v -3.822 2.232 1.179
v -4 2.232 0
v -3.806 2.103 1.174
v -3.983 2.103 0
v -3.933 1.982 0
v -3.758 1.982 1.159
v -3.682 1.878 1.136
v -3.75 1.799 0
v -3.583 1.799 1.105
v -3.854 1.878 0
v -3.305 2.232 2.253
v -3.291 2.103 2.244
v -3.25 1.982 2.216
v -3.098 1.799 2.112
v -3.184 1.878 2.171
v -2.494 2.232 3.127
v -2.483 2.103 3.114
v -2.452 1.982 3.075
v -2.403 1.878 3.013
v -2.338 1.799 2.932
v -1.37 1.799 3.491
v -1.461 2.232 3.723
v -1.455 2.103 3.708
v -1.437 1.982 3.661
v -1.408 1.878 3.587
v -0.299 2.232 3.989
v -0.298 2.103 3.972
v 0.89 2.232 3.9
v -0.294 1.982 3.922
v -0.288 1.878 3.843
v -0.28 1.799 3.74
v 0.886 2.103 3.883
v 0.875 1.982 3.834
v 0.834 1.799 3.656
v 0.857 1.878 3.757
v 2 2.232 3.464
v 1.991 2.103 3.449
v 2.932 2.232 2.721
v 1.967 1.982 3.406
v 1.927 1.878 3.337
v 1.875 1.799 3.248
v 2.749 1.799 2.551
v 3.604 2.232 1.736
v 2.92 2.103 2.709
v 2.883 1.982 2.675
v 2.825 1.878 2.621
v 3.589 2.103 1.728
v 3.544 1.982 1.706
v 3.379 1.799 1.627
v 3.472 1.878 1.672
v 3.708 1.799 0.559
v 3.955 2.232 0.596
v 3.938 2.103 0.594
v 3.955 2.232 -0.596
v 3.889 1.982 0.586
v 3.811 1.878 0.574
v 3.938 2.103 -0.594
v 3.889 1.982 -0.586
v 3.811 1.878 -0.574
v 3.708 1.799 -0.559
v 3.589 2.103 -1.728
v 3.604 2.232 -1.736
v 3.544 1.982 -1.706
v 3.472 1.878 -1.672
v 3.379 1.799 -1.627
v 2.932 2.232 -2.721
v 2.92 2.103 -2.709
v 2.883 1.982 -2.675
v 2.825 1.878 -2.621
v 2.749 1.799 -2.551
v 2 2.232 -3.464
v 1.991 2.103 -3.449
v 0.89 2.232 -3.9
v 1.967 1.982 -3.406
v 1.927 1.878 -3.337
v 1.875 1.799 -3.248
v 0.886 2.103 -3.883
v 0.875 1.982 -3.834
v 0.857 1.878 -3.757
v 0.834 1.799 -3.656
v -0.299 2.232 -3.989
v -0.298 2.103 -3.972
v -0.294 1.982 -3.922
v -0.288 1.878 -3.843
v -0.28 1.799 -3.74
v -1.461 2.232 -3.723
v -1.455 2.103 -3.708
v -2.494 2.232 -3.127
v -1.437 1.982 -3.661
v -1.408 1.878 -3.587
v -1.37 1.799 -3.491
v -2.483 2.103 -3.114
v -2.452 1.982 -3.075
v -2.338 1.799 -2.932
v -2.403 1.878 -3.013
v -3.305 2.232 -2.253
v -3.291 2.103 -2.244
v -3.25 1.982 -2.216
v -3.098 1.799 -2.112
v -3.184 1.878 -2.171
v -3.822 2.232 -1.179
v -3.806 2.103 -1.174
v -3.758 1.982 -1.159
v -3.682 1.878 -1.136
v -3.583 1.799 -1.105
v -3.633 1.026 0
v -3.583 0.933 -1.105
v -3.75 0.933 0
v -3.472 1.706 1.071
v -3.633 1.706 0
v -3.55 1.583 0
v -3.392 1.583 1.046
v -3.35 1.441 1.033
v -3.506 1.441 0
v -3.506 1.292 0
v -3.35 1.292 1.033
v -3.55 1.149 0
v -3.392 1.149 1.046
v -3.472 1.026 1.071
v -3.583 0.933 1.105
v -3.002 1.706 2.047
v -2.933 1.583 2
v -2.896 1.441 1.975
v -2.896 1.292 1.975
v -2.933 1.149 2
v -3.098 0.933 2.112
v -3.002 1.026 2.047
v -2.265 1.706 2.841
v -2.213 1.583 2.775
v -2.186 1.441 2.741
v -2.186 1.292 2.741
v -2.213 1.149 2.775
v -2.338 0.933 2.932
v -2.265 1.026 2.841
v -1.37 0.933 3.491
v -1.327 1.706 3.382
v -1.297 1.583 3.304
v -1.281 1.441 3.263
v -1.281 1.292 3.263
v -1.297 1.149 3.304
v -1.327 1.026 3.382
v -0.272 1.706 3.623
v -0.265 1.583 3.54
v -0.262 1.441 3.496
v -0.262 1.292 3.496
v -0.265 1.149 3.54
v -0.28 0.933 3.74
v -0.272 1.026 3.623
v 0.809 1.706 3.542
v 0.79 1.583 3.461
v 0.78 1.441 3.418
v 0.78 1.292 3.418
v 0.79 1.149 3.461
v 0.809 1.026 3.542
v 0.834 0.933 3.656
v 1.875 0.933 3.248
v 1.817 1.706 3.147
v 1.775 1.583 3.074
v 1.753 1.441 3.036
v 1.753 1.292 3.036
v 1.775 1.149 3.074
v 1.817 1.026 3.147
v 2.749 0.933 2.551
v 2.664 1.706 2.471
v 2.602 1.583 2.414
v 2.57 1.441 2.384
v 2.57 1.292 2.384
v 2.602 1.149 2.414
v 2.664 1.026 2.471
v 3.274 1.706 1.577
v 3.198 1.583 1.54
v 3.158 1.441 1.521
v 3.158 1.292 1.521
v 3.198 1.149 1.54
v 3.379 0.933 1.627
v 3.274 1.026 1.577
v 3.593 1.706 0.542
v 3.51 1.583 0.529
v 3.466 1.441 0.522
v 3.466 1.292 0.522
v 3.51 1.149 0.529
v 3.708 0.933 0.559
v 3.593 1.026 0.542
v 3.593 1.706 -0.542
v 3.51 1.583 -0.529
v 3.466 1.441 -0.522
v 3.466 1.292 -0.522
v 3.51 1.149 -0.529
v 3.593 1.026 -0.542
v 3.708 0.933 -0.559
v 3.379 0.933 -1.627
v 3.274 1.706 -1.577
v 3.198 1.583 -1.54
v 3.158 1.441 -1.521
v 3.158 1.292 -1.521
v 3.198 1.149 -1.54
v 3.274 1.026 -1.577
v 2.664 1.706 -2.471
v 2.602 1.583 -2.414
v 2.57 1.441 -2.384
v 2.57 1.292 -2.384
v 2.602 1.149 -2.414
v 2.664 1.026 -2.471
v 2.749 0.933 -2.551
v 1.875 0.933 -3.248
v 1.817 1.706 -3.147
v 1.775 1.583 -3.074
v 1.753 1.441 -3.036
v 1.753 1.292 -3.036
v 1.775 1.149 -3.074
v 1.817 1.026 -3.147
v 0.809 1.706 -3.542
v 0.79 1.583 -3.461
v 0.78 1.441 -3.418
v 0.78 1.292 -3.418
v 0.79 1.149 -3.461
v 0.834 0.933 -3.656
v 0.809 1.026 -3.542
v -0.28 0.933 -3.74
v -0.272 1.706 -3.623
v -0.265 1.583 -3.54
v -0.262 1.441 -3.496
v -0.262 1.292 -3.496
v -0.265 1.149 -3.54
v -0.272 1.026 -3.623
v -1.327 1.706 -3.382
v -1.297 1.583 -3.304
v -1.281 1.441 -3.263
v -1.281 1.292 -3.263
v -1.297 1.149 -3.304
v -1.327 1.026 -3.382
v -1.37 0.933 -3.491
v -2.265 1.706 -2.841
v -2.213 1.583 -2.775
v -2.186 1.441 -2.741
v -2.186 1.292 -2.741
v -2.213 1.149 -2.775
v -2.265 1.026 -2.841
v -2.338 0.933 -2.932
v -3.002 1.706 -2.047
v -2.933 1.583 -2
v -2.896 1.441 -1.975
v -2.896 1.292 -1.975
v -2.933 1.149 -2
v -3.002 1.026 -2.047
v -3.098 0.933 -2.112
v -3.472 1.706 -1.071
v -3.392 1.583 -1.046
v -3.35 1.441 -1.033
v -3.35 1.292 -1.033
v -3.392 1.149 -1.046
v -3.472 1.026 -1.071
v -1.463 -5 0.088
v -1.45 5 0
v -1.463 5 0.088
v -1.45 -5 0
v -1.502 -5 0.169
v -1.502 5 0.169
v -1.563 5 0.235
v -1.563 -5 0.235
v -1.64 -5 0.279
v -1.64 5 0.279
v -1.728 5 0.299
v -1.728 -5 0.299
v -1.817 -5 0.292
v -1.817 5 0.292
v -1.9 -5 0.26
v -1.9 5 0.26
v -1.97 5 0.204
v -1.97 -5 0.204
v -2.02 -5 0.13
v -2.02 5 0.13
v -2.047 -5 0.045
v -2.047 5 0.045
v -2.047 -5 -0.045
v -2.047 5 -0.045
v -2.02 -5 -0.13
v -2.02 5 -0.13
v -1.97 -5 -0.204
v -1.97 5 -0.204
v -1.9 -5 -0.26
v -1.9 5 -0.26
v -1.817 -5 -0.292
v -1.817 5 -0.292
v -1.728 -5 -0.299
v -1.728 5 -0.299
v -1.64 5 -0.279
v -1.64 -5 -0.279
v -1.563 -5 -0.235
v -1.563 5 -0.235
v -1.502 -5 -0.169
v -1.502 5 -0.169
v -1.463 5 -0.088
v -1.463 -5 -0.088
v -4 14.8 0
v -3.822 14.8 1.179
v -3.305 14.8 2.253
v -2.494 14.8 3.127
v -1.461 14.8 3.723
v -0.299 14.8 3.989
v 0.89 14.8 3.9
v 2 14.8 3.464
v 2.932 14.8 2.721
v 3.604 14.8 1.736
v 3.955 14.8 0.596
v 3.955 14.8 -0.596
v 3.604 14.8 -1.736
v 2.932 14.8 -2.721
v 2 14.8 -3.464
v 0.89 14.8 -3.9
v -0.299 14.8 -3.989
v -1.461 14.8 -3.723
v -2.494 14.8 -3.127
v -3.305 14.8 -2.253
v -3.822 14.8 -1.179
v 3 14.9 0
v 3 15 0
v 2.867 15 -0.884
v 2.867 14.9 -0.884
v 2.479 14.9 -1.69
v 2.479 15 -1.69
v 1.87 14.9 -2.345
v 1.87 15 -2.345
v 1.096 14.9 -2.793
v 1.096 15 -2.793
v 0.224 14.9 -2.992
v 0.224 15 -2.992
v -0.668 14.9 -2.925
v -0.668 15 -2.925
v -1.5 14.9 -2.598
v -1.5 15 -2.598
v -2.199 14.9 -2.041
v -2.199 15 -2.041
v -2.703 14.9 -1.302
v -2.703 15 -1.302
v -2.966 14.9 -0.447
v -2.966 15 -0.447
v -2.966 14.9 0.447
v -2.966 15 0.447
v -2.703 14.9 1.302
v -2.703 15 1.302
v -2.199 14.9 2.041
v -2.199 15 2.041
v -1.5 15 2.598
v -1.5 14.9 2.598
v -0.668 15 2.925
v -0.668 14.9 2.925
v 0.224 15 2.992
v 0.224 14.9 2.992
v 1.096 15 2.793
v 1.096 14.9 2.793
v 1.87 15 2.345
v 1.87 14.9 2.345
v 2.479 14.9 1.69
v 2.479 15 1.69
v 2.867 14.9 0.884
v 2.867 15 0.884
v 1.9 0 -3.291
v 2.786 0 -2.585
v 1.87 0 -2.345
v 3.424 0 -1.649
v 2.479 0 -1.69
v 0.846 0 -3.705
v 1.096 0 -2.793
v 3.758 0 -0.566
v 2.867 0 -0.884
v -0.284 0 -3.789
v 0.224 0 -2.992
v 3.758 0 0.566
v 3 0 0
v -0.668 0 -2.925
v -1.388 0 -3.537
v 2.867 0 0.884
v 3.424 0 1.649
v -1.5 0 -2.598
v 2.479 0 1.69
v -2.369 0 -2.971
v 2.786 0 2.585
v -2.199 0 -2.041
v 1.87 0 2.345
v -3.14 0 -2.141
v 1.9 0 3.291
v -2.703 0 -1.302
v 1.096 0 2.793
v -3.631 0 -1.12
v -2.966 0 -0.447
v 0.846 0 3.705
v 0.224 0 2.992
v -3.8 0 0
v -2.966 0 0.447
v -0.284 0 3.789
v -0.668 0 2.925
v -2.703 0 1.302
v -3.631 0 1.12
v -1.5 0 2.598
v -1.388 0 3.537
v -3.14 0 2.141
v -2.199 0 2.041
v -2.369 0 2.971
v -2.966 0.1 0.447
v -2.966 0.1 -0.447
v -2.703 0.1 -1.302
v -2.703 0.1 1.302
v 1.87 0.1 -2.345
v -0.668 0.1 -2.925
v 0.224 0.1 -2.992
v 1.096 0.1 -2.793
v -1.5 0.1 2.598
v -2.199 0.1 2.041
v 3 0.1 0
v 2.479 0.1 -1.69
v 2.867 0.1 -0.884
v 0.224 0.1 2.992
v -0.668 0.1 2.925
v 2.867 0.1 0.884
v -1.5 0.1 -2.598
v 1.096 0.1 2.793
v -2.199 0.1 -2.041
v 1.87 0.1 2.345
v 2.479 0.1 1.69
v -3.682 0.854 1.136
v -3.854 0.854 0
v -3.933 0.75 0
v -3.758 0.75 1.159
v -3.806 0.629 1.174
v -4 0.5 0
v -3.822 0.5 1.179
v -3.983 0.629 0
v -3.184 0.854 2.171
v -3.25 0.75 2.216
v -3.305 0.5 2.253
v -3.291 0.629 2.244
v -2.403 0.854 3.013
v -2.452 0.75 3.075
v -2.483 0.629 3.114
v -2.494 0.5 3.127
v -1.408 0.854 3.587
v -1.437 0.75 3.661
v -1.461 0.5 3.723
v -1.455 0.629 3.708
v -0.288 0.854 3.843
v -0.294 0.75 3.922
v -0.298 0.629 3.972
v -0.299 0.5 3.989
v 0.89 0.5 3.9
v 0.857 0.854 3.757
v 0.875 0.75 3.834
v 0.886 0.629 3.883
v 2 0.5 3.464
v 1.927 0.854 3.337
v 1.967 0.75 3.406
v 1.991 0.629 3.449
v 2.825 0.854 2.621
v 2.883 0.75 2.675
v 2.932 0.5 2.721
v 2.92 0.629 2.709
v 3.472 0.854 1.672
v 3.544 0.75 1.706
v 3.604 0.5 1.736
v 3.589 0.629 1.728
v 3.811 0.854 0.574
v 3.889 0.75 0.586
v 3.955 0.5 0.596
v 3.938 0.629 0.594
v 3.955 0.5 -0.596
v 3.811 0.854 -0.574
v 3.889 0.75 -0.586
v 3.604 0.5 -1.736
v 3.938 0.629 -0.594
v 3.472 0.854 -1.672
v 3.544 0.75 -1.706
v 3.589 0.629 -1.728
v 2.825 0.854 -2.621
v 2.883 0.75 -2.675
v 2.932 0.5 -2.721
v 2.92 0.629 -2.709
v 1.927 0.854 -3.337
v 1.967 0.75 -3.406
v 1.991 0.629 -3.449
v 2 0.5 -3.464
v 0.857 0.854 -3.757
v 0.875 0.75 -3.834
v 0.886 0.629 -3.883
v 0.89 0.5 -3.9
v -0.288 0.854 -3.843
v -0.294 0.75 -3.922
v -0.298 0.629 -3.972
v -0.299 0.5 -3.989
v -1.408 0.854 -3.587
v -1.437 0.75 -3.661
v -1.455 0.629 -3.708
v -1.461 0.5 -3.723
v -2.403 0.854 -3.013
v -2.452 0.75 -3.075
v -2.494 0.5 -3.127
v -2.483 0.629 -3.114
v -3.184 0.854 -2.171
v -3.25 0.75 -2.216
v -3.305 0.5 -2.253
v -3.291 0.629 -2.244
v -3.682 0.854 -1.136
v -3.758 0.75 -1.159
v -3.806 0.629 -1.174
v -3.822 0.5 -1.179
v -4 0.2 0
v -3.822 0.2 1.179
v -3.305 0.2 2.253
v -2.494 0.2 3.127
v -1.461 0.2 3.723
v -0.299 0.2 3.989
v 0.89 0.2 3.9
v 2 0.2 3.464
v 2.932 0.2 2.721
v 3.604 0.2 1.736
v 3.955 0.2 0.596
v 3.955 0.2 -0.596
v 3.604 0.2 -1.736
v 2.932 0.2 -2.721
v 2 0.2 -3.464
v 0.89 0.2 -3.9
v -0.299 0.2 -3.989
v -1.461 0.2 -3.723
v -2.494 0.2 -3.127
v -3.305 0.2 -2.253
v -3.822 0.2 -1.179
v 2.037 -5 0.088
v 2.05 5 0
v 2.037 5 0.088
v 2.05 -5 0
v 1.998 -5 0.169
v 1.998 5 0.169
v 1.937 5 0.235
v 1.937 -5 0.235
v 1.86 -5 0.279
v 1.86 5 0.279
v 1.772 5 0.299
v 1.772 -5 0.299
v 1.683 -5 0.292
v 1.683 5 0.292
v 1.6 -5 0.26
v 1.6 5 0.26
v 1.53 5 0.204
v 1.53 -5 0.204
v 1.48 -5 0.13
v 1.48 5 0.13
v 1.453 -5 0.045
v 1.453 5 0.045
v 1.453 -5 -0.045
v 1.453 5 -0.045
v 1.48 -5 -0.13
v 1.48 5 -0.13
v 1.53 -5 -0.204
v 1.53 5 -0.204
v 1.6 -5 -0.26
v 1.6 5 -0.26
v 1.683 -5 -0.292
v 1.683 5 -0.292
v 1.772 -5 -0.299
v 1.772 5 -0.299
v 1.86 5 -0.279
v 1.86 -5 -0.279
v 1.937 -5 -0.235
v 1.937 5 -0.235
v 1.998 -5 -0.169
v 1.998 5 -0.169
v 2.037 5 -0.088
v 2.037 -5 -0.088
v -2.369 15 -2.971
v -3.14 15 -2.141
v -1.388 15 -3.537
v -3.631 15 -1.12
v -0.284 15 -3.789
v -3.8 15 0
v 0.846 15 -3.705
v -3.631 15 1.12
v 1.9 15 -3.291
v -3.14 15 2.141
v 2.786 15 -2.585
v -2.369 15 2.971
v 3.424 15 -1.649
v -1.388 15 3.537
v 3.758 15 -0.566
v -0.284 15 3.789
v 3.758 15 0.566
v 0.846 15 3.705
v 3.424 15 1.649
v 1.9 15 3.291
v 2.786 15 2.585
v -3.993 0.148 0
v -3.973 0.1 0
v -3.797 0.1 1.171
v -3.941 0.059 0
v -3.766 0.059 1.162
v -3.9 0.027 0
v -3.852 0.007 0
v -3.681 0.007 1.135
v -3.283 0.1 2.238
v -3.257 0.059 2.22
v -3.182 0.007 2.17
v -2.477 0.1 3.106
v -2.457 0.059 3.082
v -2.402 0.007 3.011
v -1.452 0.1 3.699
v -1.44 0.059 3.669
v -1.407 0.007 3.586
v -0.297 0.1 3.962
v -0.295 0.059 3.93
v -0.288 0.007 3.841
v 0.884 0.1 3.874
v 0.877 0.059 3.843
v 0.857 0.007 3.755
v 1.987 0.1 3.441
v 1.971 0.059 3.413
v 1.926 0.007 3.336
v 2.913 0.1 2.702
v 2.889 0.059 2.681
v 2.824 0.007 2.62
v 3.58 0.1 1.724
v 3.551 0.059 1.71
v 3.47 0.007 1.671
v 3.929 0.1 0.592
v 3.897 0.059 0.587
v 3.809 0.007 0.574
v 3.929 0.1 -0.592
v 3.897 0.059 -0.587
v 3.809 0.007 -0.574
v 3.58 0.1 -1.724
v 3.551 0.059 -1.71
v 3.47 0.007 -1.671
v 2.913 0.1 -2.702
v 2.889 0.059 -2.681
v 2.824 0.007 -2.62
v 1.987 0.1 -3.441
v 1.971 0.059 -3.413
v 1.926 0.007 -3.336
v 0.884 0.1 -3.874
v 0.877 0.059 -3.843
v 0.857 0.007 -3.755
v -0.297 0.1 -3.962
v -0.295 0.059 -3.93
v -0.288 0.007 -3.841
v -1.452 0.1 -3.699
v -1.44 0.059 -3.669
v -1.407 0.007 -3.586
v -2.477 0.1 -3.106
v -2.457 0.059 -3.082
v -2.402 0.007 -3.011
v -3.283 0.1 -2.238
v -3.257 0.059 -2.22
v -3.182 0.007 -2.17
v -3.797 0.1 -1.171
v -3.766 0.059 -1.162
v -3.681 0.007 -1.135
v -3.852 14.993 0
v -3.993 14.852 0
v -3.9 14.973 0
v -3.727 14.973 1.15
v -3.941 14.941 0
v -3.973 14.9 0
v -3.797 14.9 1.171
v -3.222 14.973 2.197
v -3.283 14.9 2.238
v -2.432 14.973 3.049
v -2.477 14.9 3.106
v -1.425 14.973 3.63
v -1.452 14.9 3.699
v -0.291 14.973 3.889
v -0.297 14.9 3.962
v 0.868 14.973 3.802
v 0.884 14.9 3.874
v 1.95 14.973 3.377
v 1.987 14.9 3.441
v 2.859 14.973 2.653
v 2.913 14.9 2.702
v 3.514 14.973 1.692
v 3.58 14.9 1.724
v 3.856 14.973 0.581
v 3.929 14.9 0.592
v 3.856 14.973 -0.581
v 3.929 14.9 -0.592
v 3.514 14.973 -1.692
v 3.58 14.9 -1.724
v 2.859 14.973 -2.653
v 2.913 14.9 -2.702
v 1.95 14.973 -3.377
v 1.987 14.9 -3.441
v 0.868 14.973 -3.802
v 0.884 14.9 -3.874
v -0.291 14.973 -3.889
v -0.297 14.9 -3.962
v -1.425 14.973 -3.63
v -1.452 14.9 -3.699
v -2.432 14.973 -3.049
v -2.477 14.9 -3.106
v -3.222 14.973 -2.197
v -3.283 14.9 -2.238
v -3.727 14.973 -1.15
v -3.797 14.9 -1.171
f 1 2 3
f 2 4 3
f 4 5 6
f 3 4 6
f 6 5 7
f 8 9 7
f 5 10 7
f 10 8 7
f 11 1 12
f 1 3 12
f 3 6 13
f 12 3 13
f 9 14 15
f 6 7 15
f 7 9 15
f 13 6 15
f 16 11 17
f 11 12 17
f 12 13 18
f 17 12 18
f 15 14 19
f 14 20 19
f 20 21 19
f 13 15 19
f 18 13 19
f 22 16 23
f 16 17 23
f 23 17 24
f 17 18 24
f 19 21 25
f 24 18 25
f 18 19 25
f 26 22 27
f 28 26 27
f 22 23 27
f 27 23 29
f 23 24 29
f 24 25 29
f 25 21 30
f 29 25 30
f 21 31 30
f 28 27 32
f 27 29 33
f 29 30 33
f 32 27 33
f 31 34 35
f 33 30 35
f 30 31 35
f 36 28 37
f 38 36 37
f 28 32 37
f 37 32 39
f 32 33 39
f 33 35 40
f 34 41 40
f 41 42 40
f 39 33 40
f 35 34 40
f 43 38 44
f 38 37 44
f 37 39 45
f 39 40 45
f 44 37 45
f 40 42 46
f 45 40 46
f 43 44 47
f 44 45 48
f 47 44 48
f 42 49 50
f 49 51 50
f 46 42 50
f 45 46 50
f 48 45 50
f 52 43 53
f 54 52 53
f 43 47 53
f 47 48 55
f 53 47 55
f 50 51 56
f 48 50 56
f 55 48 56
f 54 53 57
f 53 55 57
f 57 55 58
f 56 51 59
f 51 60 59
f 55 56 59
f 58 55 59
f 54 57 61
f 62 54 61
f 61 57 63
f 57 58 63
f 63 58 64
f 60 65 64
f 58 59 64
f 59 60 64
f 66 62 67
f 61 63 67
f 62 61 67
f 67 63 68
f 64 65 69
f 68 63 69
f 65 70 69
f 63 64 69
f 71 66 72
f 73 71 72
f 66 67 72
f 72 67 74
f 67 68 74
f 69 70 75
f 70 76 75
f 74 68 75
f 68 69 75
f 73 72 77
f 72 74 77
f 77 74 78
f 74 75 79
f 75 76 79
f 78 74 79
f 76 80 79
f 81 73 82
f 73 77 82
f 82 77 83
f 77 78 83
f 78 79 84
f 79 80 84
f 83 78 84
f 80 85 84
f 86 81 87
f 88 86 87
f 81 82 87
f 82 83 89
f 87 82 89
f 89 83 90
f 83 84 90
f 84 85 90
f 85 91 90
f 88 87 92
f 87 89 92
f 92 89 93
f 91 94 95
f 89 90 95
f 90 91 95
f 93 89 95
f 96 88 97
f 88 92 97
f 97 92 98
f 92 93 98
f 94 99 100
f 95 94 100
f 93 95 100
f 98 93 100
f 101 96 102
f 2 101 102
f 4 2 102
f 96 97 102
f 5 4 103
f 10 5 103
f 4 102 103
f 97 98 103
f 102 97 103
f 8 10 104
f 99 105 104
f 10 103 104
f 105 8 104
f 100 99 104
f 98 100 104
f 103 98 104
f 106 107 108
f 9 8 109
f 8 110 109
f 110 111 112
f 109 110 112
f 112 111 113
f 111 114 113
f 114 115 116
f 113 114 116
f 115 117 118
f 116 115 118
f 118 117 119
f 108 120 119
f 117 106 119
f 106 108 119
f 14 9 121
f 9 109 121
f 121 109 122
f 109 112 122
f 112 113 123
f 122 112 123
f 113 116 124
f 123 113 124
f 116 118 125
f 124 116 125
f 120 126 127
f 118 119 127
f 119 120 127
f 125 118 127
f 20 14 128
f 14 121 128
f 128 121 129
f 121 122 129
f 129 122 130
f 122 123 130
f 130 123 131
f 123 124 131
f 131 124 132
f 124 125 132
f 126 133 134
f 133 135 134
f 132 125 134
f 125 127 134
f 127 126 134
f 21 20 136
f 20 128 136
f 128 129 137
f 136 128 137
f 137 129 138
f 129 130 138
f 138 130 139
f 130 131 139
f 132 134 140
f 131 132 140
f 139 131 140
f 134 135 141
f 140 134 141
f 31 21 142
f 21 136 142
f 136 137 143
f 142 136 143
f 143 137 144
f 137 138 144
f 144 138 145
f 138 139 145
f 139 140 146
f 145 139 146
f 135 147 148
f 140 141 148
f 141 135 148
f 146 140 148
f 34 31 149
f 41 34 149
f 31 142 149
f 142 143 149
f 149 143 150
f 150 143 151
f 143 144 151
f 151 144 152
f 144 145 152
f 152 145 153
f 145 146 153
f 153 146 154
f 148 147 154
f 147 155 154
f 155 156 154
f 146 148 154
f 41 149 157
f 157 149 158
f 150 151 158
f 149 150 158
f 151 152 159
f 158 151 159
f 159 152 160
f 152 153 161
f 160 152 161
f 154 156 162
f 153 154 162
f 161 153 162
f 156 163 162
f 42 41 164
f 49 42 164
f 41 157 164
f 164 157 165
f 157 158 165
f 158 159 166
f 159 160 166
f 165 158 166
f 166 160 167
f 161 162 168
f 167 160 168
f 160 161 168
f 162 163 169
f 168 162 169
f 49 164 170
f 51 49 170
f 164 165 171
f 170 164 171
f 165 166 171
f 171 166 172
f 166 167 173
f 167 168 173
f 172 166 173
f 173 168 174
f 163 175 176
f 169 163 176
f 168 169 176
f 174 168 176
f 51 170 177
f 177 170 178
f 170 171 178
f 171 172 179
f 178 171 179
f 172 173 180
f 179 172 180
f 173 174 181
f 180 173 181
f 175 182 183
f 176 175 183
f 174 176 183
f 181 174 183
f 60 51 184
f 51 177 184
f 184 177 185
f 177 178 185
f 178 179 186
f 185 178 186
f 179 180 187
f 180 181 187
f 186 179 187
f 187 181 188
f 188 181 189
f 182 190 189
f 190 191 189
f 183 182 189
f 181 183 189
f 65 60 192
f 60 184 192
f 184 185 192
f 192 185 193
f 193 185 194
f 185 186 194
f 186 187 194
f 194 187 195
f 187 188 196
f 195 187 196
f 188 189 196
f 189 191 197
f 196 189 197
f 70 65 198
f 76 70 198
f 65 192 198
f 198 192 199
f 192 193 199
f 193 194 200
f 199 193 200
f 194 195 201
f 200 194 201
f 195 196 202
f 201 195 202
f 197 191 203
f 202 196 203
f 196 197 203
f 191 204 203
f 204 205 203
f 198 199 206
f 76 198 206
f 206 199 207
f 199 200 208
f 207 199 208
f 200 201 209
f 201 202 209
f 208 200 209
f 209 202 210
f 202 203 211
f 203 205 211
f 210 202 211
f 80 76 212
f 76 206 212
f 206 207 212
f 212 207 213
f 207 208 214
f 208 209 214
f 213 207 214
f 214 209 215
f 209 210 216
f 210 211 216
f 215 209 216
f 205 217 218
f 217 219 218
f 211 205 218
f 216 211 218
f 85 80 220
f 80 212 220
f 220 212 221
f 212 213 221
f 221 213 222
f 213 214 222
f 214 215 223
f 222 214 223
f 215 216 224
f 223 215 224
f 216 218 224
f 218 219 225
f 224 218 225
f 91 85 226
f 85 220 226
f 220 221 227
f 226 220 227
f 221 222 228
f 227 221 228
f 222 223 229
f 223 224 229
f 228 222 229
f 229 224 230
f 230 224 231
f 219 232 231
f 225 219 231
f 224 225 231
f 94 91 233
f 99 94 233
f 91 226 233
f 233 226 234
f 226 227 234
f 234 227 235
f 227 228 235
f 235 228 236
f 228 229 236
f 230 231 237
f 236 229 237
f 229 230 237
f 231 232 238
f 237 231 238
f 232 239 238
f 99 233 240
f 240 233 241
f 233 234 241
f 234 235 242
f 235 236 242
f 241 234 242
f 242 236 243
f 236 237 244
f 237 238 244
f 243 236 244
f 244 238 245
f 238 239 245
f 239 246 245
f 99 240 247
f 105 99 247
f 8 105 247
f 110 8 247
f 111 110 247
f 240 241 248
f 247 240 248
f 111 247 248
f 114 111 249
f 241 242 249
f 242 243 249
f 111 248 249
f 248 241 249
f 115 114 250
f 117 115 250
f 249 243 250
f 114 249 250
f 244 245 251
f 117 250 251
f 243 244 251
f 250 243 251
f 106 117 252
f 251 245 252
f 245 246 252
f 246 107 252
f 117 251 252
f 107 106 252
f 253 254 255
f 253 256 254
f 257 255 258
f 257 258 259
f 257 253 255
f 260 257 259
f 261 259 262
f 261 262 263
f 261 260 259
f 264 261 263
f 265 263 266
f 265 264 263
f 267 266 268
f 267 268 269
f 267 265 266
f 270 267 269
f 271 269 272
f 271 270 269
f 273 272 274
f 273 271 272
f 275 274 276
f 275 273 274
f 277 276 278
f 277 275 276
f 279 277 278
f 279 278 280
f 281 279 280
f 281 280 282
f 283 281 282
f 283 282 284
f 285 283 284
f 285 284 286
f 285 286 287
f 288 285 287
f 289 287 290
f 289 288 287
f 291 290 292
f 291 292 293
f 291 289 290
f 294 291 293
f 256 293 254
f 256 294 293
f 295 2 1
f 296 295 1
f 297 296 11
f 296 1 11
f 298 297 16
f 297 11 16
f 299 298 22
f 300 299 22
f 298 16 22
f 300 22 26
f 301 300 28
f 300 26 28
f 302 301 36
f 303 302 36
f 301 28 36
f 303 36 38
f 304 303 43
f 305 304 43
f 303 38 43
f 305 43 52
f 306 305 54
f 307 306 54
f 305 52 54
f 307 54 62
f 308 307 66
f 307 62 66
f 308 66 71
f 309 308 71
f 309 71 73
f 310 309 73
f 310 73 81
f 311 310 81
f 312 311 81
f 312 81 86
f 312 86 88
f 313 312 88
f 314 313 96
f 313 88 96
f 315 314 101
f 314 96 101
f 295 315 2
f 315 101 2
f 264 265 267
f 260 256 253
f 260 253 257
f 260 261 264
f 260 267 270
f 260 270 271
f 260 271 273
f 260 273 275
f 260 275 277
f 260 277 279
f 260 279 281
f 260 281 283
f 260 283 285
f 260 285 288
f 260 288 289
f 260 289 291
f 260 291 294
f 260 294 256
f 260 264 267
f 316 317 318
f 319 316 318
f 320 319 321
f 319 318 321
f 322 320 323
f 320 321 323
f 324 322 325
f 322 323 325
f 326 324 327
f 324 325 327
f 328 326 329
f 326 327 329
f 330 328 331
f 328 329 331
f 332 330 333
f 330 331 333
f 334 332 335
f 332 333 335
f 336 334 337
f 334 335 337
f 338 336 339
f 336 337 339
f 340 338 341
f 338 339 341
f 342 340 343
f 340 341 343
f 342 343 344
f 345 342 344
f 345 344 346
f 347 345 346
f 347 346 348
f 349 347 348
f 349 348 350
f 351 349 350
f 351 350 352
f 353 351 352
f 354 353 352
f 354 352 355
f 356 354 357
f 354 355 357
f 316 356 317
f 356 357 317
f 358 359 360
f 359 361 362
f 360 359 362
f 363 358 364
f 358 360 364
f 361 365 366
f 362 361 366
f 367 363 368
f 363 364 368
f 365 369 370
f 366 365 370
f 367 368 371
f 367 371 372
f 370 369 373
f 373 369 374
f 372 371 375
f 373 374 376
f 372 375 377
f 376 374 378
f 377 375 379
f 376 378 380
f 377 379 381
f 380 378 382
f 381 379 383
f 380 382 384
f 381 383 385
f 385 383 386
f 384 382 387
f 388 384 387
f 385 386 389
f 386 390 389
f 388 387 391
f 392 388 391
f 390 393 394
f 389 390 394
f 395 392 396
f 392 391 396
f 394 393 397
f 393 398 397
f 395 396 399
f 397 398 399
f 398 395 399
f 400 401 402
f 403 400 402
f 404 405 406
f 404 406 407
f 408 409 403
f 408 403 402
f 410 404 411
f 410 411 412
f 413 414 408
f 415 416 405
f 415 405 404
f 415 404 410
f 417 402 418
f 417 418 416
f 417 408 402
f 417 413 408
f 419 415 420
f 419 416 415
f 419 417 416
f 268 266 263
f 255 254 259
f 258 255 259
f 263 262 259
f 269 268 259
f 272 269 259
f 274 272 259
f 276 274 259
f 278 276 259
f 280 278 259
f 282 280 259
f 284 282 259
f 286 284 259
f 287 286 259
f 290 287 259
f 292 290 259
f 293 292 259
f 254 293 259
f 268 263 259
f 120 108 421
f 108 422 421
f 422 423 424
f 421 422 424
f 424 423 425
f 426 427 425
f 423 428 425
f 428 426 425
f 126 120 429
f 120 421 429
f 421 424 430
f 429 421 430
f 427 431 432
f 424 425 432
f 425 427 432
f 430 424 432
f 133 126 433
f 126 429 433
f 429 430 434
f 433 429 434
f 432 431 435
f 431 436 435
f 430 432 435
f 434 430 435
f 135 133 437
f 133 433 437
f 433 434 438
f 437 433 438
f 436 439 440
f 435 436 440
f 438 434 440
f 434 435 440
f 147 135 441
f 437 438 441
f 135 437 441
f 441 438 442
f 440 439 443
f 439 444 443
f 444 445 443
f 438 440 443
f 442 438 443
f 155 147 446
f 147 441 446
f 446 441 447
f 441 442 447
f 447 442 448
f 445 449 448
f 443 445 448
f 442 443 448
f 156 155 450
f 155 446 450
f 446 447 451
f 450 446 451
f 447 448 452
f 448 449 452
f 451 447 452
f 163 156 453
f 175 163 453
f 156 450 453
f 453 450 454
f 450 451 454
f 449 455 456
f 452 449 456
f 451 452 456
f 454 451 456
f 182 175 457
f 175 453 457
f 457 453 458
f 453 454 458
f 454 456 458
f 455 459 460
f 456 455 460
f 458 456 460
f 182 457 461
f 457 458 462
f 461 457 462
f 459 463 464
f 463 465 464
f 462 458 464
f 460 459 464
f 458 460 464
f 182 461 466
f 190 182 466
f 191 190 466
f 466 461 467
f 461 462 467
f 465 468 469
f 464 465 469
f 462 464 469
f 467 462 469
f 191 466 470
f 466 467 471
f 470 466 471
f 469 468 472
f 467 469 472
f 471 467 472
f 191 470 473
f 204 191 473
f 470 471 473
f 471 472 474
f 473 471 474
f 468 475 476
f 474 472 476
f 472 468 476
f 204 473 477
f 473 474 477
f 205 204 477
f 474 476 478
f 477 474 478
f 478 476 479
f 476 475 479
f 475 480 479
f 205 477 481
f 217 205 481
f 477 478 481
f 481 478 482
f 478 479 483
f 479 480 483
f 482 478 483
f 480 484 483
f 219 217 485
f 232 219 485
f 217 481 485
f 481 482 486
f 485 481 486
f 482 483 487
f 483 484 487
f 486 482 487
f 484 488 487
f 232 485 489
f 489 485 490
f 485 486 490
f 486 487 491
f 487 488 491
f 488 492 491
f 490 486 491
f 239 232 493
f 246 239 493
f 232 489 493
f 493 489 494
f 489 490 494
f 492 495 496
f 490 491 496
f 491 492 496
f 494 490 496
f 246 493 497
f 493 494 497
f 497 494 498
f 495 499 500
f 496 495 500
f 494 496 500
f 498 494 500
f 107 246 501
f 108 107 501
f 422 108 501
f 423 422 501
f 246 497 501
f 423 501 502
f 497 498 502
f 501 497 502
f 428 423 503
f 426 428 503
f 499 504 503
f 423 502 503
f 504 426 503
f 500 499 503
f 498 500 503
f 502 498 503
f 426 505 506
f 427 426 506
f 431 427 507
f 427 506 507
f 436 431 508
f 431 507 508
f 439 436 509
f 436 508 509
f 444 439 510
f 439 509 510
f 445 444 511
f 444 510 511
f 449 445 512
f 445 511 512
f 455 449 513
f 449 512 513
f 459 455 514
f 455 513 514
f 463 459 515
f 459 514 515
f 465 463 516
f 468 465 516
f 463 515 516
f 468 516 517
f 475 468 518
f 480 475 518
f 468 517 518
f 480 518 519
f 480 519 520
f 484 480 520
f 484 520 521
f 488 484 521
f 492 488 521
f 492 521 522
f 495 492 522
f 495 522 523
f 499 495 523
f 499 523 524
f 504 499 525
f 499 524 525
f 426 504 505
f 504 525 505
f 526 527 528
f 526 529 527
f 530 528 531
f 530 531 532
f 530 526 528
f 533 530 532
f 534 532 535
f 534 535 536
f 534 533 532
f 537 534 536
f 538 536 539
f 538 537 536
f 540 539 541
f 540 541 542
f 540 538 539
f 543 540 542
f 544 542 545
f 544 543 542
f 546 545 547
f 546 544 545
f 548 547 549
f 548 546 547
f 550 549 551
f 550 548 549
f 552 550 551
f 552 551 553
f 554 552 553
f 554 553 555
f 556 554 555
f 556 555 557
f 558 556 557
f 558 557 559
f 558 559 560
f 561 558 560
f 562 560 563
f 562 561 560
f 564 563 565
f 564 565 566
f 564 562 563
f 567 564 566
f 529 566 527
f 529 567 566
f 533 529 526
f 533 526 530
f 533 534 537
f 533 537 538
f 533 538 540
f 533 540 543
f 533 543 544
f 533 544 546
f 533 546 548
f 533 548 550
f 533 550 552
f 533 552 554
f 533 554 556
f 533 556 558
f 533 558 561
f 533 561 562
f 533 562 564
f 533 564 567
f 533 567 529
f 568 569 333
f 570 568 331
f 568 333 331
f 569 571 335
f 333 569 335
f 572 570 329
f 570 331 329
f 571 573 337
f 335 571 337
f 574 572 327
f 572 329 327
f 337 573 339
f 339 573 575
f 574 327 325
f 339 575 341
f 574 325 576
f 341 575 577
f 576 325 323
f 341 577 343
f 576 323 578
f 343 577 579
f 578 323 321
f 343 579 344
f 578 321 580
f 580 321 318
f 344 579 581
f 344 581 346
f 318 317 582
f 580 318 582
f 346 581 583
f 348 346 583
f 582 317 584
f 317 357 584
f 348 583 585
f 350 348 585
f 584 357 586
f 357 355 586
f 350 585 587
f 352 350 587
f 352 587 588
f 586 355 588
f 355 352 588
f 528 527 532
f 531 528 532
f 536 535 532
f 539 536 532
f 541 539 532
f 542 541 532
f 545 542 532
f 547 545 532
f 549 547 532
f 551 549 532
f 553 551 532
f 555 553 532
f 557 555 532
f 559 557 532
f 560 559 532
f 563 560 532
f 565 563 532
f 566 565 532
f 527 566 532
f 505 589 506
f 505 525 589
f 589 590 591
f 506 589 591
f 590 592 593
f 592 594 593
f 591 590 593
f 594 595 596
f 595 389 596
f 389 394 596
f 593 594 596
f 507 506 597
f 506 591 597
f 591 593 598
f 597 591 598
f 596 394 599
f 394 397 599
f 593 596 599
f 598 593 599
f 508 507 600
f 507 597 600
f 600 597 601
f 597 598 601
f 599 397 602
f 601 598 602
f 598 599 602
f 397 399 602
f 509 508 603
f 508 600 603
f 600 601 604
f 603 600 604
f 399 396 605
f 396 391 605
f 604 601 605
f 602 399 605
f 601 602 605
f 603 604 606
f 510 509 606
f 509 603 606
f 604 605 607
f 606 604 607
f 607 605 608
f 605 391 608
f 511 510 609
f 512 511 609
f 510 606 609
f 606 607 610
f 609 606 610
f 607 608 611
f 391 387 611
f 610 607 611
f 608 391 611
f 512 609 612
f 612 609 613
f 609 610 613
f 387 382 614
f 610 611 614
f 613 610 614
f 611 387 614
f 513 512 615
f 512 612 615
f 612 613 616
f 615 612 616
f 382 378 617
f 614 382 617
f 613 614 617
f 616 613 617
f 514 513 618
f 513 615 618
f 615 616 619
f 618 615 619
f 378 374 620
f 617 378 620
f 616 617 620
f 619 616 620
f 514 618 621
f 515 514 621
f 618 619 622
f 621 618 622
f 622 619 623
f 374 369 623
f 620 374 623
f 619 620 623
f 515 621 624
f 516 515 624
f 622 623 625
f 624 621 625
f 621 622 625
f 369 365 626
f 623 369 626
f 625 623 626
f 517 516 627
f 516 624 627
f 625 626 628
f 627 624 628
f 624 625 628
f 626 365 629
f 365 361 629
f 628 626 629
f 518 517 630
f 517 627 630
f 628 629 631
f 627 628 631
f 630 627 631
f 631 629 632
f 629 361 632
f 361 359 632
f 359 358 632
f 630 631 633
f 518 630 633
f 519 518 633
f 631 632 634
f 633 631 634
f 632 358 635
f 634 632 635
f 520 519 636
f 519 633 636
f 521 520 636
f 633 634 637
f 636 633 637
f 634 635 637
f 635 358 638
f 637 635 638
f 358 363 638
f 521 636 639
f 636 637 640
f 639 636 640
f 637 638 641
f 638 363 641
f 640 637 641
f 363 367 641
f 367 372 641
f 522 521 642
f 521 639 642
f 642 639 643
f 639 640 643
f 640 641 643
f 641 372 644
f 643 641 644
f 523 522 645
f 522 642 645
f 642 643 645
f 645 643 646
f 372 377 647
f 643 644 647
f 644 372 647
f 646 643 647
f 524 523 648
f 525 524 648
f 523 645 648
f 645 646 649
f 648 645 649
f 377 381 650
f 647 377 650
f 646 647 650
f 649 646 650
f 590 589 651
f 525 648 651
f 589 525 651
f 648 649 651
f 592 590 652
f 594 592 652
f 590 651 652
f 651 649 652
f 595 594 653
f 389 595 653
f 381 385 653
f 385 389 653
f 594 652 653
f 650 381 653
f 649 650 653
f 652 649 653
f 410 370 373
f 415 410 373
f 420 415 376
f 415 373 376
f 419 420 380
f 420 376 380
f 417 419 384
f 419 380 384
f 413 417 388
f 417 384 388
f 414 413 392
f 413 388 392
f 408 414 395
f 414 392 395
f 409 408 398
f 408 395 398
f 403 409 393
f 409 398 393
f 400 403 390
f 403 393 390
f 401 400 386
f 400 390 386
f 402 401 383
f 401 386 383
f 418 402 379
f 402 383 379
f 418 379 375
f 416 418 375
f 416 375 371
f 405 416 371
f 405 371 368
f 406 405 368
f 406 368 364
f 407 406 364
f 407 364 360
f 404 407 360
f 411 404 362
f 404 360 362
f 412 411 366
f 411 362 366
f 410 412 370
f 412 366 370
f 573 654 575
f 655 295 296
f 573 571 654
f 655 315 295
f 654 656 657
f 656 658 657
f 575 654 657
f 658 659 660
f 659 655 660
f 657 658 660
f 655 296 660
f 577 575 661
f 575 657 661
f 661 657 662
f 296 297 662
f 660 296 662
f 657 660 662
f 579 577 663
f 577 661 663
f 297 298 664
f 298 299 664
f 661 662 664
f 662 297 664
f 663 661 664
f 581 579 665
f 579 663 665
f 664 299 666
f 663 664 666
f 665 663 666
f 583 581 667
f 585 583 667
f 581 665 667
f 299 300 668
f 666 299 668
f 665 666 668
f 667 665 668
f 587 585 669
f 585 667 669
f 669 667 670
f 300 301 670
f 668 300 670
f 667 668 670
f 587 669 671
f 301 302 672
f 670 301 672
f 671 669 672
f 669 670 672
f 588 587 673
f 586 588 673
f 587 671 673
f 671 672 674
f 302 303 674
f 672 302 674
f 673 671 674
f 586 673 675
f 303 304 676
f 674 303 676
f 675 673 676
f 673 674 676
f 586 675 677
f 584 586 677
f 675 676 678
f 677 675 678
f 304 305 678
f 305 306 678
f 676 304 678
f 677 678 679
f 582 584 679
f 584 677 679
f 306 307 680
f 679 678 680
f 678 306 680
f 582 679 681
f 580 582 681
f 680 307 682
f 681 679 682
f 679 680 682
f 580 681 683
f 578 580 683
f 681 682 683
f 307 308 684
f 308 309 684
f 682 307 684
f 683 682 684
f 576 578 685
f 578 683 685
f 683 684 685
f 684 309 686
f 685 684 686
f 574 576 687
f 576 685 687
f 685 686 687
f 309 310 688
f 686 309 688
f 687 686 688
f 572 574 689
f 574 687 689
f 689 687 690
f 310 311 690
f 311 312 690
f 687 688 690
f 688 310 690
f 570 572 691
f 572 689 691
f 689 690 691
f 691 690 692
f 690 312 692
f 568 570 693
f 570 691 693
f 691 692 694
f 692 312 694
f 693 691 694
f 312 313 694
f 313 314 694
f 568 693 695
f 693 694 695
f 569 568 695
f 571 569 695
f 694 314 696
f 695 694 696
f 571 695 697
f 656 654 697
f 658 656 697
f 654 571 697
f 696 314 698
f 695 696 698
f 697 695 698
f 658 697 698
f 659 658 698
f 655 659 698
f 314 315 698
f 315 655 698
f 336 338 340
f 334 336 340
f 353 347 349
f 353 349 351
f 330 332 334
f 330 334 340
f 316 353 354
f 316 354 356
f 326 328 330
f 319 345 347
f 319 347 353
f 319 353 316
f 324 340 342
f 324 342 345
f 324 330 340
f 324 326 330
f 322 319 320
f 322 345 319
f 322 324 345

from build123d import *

# Parameters (mm, degrees)
FILLET2_R             = 0.2
SKETCH3_R             = 3
CUT_EXTRUDE1_DEPTH    = 0.1
SKETCH4_R             = 3
CUT_EXTRUDE2_DEPTH    = 0.1
SKETCH2_R             = 0.3
BOSS_EXTRUDE1_DEPTH   = 5
BOSS_EXTRUDE1_2_DEPTH = 5


with BuildPart() as part:
    # Sketch1 → Revolve1 (revolve)
    with BuildSketch(Plane.XY):
        with BuildLine():
            Line((0, 0), (0, 15))
            Line((0, 15), (-4, 15))
            Line((-4, 15), (-4, 2.232050808))
            ThreePointArc((-4, 2.232050808), (-3.933012702, 1.982050808), (-3.75, 1.799038106))
            ThreePointArc((-3.75, 1.799038106), (-3.5, 1.366025404), (-3.75, 0.933012702))
            ThreePointArc((-3.75, 0.933012702), (-3.933012702, 0.75), (-4, 0.5))
            Line((-4, 0.5), (-4, 0))
            Line((-4, 0), (0, 0))
        make_face()
    revolve(axis=Axis((0, 0, 0), (0, 1, 0)))

    # Fillet2
    fillet2_edges = [part.edges().sort_by_distance(p)[0] for p in [
        (4, 0, 0),
        (4, 15, 0),
    ]]
    fillet(fillet2_edges, radius=FILLET2_R)

    # Sketch3 → Cut-Extrude1 (cut)
    with BuildSketch(Plane(origin=(0, 15, 0), x_dir=(1, 0, 0), z_dir=(0, 1, 0))):
        Circle(SKETCH3_R)
    extrude(amount=-CUT_EXTRUDE1_DEPTH, mode=Mode.SUBTRACT)

    # Sketch4 → Cut-Extrude2 (cut)
    with BuildSketch(Plane.XZ):
        Circle(SKETCH4_R)
    extrude(amount=-CUT_EXTRUDE2_DEPTH, mode=Mode.SUBTRACT)


with BuildPart() as body_2:
    # Sketch2 → Boss-Extrude1 (new body, symmetric)
    with BuildSketch(Plane.XZ):
        with Locations((-1.75, 0)):
            Circle(SKETCH2_R)
    extrude(amount=BOSS_EXTRUDE1_DEPTH, both=True)


with BuildPart() as body_3:
    # Sketch2 → Boss-Extrude1 2 (new body, symmetric)
    with BuildSketch(Plane.XZ):
        with Locations((1.75, 0)):
            Circle(SKETCH2_R)
    extrude(amount=BOSS_EXTRUDE1_2_DEPTH, both=True)


solid = Compound([part.part, body_2.part, body_3.part])
